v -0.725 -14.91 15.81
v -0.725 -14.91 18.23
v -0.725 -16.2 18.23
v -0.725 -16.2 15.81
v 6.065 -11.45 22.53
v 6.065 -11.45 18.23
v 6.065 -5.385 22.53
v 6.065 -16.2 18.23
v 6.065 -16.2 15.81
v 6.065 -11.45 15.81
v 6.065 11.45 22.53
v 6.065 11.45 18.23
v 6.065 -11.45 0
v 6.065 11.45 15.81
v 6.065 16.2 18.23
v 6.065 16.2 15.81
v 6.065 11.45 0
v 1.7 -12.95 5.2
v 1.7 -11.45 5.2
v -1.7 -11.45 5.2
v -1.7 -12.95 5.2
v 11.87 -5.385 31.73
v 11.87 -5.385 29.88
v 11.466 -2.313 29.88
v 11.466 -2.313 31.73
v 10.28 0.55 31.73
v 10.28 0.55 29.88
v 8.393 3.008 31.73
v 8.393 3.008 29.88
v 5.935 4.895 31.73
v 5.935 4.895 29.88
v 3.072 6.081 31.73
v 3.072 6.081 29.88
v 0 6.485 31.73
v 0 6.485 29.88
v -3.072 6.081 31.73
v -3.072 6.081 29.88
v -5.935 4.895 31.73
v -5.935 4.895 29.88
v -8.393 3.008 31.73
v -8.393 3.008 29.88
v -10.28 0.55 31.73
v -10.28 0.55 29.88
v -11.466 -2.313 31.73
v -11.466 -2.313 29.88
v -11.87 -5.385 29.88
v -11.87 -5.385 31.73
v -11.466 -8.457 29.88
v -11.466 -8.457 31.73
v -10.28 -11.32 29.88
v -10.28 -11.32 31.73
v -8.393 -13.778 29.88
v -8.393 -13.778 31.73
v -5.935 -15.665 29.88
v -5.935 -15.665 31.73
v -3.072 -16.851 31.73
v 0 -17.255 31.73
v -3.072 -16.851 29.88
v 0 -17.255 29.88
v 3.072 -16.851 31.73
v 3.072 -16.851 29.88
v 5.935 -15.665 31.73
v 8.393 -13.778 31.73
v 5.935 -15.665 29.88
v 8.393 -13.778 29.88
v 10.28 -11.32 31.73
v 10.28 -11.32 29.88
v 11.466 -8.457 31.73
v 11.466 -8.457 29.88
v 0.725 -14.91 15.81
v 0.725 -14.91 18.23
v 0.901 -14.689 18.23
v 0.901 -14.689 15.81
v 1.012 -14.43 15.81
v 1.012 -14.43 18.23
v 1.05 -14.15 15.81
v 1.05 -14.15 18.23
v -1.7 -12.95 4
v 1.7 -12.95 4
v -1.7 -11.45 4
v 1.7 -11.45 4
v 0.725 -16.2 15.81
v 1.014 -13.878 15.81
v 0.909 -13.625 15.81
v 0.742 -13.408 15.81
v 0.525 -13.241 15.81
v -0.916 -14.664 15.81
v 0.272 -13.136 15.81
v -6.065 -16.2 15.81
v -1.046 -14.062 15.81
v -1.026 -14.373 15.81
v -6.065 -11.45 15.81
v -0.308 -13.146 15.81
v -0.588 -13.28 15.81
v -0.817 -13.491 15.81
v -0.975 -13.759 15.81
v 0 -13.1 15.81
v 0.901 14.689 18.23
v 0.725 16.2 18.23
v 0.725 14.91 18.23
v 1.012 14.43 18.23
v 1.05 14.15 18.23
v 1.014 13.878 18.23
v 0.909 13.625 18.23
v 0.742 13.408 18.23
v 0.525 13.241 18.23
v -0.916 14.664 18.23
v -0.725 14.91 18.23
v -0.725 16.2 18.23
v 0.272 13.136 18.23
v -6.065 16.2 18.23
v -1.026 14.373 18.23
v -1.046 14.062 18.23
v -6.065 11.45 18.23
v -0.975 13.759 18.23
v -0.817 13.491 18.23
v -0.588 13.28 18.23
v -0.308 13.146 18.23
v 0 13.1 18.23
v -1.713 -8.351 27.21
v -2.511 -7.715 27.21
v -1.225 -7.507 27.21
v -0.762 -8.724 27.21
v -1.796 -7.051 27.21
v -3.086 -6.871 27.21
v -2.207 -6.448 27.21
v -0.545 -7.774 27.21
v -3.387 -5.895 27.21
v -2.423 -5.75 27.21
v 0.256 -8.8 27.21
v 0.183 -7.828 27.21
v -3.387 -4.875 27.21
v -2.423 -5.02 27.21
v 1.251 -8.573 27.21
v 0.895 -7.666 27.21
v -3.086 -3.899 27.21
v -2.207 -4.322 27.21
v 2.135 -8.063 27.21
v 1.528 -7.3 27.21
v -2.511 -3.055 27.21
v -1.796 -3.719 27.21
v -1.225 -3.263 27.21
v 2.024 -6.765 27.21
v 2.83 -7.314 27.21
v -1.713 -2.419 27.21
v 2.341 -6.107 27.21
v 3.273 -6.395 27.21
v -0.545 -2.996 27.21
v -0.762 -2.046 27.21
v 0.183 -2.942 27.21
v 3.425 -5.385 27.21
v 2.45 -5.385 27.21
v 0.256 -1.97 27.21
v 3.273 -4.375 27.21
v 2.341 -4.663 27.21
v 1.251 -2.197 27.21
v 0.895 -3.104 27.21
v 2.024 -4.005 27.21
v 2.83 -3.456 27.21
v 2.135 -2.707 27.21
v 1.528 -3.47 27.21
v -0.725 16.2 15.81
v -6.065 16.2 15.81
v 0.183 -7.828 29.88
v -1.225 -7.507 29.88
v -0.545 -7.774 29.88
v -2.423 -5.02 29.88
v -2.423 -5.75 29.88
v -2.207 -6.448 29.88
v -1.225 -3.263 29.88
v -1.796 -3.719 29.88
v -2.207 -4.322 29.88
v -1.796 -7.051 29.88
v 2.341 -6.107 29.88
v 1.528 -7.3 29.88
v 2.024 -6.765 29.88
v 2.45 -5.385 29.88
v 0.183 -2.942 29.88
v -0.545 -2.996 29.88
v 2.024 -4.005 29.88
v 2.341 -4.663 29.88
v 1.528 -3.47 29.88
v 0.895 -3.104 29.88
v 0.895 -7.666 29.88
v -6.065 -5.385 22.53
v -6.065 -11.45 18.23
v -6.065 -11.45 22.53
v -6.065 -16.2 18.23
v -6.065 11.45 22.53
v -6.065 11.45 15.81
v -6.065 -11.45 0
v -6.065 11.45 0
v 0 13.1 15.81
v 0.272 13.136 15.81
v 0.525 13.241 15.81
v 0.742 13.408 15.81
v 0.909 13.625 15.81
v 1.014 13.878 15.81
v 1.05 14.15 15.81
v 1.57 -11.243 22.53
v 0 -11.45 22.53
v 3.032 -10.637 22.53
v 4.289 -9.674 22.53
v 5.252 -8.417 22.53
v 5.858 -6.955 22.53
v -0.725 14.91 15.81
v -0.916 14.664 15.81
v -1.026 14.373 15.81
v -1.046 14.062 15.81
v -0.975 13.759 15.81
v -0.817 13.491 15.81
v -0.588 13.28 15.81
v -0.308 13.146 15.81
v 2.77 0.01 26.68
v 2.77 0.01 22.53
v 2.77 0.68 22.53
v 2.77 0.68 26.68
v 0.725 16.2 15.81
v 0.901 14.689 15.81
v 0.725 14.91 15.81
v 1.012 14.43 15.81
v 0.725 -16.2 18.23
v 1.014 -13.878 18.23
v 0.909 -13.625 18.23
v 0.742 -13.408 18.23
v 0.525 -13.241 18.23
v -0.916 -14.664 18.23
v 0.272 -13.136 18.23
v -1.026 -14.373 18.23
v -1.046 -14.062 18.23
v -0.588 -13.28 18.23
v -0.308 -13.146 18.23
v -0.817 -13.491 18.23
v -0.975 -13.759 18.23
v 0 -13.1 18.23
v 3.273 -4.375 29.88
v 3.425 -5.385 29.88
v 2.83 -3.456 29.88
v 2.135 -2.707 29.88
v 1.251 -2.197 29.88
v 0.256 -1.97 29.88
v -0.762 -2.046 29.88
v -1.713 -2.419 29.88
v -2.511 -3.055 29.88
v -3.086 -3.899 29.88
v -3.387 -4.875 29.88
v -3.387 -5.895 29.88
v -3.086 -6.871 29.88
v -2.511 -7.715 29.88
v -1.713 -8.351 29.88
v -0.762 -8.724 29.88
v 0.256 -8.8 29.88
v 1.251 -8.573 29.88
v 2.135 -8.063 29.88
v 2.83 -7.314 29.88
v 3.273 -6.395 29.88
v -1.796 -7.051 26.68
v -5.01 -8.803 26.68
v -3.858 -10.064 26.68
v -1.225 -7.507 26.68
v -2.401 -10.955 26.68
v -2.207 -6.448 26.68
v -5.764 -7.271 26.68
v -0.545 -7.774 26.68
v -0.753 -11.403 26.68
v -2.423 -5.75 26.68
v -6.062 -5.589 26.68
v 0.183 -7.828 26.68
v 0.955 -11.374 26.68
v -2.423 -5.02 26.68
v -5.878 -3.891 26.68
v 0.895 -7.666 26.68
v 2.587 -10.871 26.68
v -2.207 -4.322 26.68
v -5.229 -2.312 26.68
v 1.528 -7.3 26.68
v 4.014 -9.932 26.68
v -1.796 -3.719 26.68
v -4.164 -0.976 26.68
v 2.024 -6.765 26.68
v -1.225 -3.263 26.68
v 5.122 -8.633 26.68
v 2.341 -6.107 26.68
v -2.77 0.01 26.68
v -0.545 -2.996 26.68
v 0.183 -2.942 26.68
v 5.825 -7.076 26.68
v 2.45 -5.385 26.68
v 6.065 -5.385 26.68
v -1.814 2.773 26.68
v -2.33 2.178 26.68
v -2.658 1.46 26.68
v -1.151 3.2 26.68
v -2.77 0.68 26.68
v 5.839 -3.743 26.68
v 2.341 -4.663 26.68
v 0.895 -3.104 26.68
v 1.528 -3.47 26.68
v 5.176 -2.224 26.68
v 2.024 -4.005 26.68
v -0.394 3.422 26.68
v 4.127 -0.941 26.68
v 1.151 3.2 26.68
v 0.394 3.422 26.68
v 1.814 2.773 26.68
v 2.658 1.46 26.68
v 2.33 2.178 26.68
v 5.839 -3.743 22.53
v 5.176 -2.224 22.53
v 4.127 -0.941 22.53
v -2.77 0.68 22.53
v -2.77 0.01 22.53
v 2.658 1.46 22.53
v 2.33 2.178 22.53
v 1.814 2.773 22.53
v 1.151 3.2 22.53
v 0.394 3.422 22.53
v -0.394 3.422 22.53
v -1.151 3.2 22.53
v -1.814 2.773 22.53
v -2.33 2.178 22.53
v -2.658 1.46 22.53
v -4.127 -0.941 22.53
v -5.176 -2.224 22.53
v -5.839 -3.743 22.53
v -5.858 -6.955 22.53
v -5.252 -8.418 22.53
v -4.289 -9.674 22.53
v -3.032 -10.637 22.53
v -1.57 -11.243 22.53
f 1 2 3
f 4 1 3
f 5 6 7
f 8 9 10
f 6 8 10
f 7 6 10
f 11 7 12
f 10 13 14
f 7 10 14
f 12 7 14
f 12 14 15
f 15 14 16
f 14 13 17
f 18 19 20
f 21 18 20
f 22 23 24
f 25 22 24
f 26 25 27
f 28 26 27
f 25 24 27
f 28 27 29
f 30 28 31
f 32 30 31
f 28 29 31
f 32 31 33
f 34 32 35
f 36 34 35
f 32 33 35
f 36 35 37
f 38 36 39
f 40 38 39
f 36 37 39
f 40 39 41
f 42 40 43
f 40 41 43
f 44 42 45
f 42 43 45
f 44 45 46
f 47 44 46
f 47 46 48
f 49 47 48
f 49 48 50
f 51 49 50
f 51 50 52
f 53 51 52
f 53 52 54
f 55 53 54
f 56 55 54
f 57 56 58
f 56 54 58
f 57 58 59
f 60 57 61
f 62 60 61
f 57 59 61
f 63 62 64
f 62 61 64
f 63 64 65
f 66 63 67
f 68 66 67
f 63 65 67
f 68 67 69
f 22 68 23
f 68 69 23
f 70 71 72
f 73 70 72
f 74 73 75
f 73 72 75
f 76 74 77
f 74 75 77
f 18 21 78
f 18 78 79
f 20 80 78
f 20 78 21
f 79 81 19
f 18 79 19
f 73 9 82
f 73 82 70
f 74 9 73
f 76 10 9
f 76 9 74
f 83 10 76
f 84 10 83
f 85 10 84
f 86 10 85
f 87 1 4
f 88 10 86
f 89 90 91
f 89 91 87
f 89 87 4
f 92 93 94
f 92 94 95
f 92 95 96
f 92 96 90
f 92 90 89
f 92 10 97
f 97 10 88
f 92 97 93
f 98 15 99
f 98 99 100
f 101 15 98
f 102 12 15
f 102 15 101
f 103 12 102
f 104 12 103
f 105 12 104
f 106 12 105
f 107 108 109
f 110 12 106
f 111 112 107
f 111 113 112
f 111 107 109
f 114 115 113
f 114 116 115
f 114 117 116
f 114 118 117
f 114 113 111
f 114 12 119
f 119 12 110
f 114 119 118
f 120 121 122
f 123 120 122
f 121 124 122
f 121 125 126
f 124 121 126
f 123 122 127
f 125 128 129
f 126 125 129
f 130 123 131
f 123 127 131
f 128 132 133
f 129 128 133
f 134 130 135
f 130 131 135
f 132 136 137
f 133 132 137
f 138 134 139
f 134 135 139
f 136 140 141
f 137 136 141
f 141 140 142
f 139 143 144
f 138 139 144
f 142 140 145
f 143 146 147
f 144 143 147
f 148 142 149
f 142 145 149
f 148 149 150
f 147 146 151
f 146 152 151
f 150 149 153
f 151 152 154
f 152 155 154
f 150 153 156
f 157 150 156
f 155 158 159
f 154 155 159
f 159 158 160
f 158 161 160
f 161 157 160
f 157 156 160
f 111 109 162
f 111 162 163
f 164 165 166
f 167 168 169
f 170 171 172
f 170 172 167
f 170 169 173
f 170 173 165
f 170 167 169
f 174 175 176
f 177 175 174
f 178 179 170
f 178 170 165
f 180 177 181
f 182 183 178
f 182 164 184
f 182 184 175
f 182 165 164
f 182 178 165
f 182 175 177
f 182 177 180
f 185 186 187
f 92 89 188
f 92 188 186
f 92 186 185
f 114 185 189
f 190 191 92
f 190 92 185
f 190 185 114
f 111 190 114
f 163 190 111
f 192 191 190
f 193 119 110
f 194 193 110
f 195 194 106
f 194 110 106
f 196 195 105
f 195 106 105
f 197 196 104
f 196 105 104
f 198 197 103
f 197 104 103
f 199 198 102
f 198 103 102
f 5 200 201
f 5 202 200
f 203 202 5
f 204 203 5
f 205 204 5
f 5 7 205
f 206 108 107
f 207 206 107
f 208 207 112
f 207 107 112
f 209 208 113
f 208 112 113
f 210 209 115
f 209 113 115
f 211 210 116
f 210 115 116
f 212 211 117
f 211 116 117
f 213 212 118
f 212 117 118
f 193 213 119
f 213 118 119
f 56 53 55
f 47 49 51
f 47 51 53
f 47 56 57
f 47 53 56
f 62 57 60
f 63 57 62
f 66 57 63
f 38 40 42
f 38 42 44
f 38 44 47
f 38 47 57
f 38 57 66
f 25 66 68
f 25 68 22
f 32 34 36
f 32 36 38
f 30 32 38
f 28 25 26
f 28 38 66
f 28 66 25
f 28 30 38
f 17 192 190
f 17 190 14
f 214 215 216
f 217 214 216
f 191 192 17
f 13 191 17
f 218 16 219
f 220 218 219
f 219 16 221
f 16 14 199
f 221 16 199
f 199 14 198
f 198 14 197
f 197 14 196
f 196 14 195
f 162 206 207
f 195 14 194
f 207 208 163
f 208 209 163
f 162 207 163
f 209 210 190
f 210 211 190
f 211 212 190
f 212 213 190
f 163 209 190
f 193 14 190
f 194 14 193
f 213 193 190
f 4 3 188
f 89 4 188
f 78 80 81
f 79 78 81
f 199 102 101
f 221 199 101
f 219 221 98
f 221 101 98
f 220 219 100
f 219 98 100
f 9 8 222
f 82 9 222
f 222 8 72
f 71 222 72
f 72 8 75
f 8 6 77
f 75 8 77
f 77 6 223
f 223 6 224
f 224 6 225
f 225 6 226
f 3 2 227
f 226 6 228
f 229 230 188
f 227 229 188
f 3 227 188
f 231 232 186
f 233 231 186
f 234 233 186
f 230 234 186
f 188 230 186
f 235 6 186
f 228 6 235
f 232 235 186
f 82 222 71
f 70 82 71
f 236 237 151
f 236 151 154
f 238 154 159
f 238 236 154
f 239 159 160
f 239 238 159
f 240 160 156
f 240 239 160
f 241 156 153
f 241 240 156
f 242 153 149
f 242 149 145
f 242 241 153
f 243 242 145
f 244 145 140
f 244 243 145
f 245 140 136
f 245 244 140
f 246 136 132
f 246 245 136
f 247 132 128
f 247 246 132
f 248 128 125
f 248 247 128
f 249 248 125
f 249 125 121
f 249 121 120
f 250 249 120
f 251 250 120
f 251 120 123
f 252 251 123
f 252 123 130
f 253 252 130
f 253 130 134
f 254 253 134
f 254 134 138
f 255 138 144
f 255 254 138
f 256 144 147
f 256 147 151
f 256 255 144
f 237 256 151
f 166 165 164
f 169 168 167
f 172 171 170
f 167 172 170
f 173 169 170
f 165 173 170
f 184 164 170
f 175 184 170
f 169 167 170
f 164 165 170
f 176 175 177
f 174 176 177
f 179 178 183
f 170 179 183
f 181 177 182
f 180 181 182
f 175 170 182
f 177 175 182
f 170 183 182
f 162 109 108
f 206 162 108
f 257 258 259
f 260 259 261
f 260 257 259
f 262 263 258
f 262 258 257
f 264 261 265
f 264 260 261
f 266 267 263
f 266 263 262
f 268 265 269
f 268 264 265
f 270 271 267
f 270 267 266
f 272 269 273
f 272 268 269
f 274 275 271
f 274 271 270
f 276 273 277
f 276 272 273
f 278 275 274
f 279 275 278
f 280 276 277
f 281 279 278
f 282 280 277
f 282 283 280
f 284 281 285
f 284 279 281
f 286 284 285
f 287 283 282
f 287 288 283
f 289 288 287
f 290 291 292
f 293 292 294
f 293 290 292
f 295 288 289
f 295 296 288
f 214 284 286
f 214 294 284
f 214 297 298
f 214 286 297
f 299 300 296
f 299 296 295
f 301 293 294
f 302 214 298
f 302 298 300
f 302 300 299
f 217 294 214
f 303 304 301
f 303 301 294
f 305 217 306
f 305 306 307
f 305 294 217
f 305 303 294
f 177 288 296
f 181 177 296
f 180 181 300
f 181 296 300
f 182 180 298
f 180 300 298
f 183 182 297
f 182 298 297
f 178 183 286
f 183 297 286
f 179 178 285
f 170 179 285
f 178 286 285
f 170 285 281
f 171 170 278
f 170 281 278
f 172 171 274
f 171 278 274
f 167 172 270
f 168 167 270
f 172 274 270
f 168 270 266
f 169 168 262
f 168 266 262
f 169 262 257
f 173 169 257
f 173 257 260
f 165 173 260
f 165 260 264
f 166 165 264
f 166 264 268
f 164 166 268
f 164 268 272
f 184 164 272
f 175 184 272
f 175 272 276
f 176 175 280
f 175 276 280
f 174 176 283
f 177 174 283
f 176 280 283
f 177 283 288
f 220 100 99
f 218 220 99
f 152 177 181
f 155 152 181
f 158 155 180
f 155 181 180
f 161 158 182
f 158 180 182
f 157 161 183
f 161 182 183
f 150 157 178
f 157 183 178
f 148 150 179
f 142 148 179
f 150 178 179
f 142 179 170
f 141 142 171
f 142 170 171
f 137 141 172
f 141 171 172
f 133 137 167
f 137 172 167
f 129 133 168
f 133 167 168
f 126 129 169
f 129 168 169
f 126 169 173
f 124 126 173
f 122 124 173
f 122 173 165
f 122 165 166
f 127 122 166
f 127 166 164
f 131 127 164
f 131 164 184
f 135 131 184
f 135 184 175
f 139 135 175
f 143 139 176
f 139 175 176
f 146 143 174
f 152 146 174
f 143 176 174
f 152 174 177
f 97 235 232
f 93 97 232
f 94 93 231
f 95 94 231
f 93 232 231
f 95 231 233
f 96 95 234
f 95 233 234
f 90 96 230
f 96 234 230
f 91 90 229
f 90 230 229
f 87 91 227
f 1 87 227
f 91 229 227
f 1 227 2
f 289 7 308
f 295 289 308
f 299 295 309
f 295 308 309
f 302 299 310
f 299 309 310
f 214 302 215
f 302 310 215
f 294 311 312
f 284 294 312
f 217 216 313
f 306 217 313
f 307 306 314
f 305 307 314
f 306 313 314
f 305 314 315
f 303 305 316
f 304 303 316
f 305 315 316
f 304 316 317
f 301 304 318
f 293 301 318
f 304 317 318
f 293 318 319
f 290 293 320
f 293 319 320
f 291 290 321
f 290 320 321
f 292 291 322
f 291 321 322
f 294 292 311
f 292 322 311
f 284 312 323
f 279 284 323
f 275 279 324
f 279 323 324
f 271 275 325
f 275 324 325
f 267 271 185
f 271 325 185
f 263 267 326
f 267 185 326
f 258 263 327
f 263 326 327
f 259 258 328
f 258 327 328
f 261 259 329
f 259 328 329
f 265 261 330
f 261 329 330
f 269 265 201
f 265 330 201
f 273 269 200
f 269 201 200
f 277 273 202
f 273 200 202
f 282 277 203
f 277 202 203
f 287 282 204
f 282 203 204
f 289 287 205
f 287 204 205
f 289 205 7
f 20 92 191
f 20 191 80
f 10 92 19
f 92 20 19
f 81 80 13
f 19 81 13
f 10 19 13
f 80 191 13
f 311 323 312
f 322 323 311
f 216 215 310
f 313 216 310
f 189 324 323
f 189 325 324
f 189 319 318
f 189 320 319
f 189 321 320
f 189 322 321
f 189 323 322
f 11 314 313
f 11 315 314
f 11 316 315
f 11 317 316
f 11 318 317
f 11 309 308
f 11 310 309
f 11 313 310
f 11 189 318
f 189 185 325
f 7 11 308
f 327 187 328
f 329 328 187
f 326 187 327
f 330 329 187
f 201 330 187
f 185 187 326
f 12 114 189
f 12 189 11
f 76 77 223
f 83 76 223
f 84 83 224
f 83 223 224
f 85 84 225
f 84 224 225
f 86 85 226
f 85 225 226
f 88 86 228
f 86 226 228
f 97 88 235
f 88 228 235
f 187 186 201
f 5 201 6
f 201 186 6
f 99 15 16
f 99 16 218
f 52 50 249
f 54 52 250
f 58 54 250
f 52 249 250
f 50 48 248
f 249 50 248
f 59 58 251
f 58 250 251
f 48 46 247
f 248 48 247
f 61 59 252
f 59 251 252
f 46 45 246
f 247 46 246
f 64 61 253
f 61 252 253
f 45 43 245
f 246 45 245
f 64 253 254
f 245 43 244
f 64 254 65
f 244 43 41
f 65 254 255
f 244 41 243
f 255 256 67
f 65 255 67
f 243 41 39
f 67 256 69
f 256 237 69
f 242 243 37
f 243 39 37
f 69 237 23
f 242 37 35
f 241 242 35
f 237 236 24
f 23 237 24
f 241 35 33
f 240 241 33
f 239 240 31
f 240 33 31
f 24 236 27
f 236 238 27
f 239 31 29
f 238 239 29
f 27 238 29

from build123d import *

# Parameters (mm, degrees)
F0_W          = 12.13
F0_H          = 22.9
F1_DEPTH      = 22.53
F2_W          = 12.13
F2_H          = 2.42
F3_DEPTH      = 4.75
F3_DEPTH_BACK = 27.65
F4_W          = 0.725
F4_H          = 1
F5_DEPTH      = 25
F6_DEPTH      = 25
F8_DEPTH      = 4.15
F9_R          = 2.45
F10_DEPTH     = 3.2
F11_R         = 11.87
F11_R_2       = 3.425
F11_R_3       = 2.45
F12_DEPTH     = 1.85
F13_DEPTH     = 2.67
F14_W         = 1.7
F14_H         = 1.2
F15_DEPTH     = 1.5


with BuildPart() as f1:
    # F0 (on Top) → F1 (new body)
    with BuildSketch(Plane.XY):
        Rectangle(F0_W, F0_H)
    extrude(amount=F1_DEPTH)

    # F2 (on face) → F3 (join, two sides)
    with BuildSketch(Plane(origin=(0, 11.45, 0), x_dir=(-1, 0, 0), z_dir=(0, 1, 0))) as f3_sk:
        with Locations((0, 17.02)):
            Rectangle(F2_W, F2_H)
    extrude(amount=F3_DEPTH)
    extrude(f3_sk.sketch, amount=-F3_DEPTH_BACK)

    # F4 (on face) → F5 (cut)
    with BuildSketch(Plane.XY.offset(18.23)):
        with BuildLine():
            ThreePointArc((0, 13.1), (0.7424621202, 13.4075378798), (1.05, 14.15))
            ThreePointArc((1.05, 14.15), (0.9653367288, 14.563067791), (0.725, 14.9095228765))
            Line((0.725, 14.9095228765), (0.725, 14.2))
            Line((0.725, 14.2), (0, 14.2))
            Line((0, 14.2), (0, 13.1))
        make_face()
        with BuildLine():
            ThreePointArc((-0.725, 14.9095228765), (-0.9746791832, 13.7594868891), (0, 13.1))
            Line((0, 13.1), (0, 14.2))
            Line((0, 14.2), (-0.725, 14.2))
            Line((-0.725, 14.2), (-0.725, 14.9095228765))
        make_face()
        with BuildLine():
            Line((0, 14.2), (0, 15.2))
            ThreePointArc((0, 15.2), (-0.3905131109, 15.1246791832), (-0.725, 14.9095228765))
            Line((-0.725, 14.9095228765), (-0.725, 14.2))
            Line((-0.725, 14.2), (0, 14.2))
        make_face()
        with BuildLine():
            Line((0.725, 14.2), (0.725, 14.9095228765))
            ThreePointArc((0.725, 14.9095228765), (0.3905131109, 15.1246791832), (0, 15.2))
            Line((0, 15.2), (0, 14.2))
            Line((0, 14.2), (0.725, 14.2))
        make_face()
        with BuildLine():
            ThreePointArc((0, 15.2), (0.3905131109, 15.1246791832), (0.725, 14.9095228765))
            Line((0.725, 14.9095228765), (0.725, 15.2))
            Line((0.725, 15.2), (0, 15.2))
        make_face()
        with Locations((0.3625, 15.7)):
            Rectangle(F4_W, F4_H)
        with Locations((-0.3625, 15.7)):
            Rectangle(F4_W, F4_H)
        with BuildLine():
            ThreePointArc((-0.725, 14.9095228765), (-0.3905131109, 15.1246791832), (0, 15.2))
            Line((0, 15.2), (-0.725, 15.2))
            Line((-0.725, 15.2), (-0.725, 14.9095228765))
        make_face()
    extrude(amount=-F5_DEPTH, mode=Mode.SUBTRACT)

    # F4 (on face) → F6 (cut)
    with BuildSketch(Plane.XY.offset(18.23)):
        with BuildLine():
            ThreePointArc((1.05, -14.15), (0.7424621202, -13.4075378798), (0, -13.1))
            Line((0, -13.1), (0, -14.2))
            Line((0, -14.2), (0.725, -14.2))
            Line((0.725, -14.2), (0.725, -14.9095228765))
            ThreePointArc((0.725, -14.9095228765), (0.9653367288, -14.563067791), (1.05, -14.15))
        make_face()
        with BuildLine():
            Line((0, -14.2), (0, -13.1))
            ThreePointArc((0, -13.1), (-0.9746791832, -13.7594868891), (-0.725, -14.9095228765))
            Line((-0.725, -14.9095228765), (-0.725, -14.2))
            Line((-0.725, -14.2), (0, -14.2))
        make_face()
        with BuildLine():
            Line((0.725, -14.2), (0, -14.2))
            Line((0, -14.2), (0, -15.2))
            ThreePointArc((1.4e-09, -15.2), (0.3905131116, -15.124679183), (0.725, -14.9095228765))
            Line((0.725, -14.9095228765), (0.725, -14.2))
        make_face()
        with BuildLine():
            ThreePointArc((0.725, -14.9095228765), (0.3905131116, -15.124679183), (1.4e-09, -15.2))
            Line((1.4e-09, -15.2), (0.725, -15.2))
            Line((0.725, -15.2), (0.725, -14.9095228765))
        make_face()
        with Locations((0.3625, -15.7)):
            Rectangle(F4_W, F4_H)
        with Locations((-0.3625, -15.7)):
            Rectangle(F4_W, F4_H)
        with BuildLine():
            Line((0, -15.2), (0, -14.2))
            Line((0, -14.2), (-0.725, -14.2))
            Line((-0.725, -14.2), (-0.725, -14.9095228765))
            ThreePointArc((-0.725, -14.9095228765), (-0.3905131103, -15.1246791835), (1.4e-09, -15.2))
        make_face()
        with BuildLine():
            ThreePointArc((1.4e-09, -15.2), (-0.3905131103, -15.1246791835), (-0.725, -14.9095228765))
            Line((-0.725, -14.9095228765), (-0.725, -15.2))
            Line((-0.725, -15.2), (1.4e-09, -15.2))
        make_face()
    extrude(amount=-F6_DEPTH, mode=Mode.SUBTRACT)

    # F7 (on face) → F8 (join)
    with BuildSketch(Plane.XY.offset(22.53)):
        with BuildLine():
            ThreePointArc((-2.77, 0.0104911732), (-3.1610263365, -10.5611121993), (6.065, -5.385))
            ThreePointArc((6.065, -5.385), (5.1761121993, -2.2239736635), (2.77, 0.0104911732))
            ThreePointArc((2.77, 0.0104911732), (2.7334664427, 0.0290914479), (2.6968079934, 0.0474443528))
            ThreePointArc((2.6968079934, 0.0474443528), (0, -2.09), (-2.6968079934, 0.0474443528))
            ThreePointArc((-2.6968079934, 0.0474443528), (-2.7334664427, 0.0290914479), (-2.77, 0.0104911732))
        make_face()
        with BuildLine():
            ThreePointArc((2.6968079934, 0.0474443528), (2.7334664427, 0.0290914479), (2.77, 0.0104911732))
            Line((2.77, 0.0104911732), (2.77, 0.68))
            ThreePointArc((2.77, 0.68), (2.7516411595, 0.3616119834), (2.6968079934, 0.0474443528))
        make_face()
        with BuildLine():
            Line((-2.77, 0.68), (-2.77, 0.0104911732))
            ThreePointArc((-2.77, 0.0104911732), (-2.7334664427, 0.0290914479), (-2.6968079934, 0.0474443528))
            ThreePointArc((-2.6968079934, 0.0474443528), (-2.7516411595, 0.3616119834), (-2.77, 0.68))
        make_face()
        with BuildLine():
            ThreePointArc((-2.6968079934, 0.0474443528), (0, 0.68), (2.6968079934, 0.0474443528))
            ThreePointArc((2.6968079934, 0.0474443528), (2.7516411595, 0.3616119834), (2.77, 0.68))
            ThreePointArc((2.77, 0.68), (0, 3.45), (-2.77, 0.68))
            ThreePointArc((-2.77, 0.68), (-2.7516411595, 0.3616119834), (-2.6968079934, 0.0474443528))
        make_face()
        with BuildLine():
            ThreePointArc((-2.6968079934, 0.0474443528), (0, -2.09), (2.6968079934, 0.0474443528))
            ThreePointArc((2.6968079934, 0.0474443528), (0, 0.68), (-2.6968079934, 0.0474443528))
        make_face()
    extrude(amount=F8_DEPTH)

    # F9 (on face) → F10 (join)
    with BuildSketch(Plane.XY.offset(26.68)):
        with Locations((0, -5.385)):
            Circle(F9_R)
    extrude(amount=F10_DEPTH)

    # F14 (on face) → F15 (join)
    with BuildSketch(Plane.XZ.offset(11.45)):
        with Locations((-0.85, 4.6)):
            Rectangle(F14_W, F14_H)
        with Locations((0.85, 4.6)):
            Rectangle(F14_W, F14_H)
    extrude(amount=F15_DEPTH)


with BuildPart() as f12:
    # F11 (on face) → F12 (new body)
    with BuildSketch(Plane.XY.offset(29.88)):
        with Locations((0, -5.385)):
            Circle(F11_R)
        with Locations((0, -5.385)):
            Circle(F11_R_2, mode=Mode.SUBTRACT)
        with Locations((0, -5.385)):
            Circle(F11_R_2)
        with Locations((0, -5.385)):
            Circle(F11_R_3, mode=Mode.SUBTRACT)
        with Locations((0, -5.385)):
            Circle(F11_R_3)
    extrude(amount=F12_DEPTH)

    # F11 (on face) → F13 (join)
    with BuildSketch(Plane.XY.offset(29.88)):
        with Locations((0, -5.385)):
            Circle(F11_R_2)
        with Locations((0, -5.385)):
            Circle(F11_R_3, mode=Mode.SUBTRACT)
    extrude(amount=-F13_DEPTH)


solid = Compound([f1.part, f12.part])
